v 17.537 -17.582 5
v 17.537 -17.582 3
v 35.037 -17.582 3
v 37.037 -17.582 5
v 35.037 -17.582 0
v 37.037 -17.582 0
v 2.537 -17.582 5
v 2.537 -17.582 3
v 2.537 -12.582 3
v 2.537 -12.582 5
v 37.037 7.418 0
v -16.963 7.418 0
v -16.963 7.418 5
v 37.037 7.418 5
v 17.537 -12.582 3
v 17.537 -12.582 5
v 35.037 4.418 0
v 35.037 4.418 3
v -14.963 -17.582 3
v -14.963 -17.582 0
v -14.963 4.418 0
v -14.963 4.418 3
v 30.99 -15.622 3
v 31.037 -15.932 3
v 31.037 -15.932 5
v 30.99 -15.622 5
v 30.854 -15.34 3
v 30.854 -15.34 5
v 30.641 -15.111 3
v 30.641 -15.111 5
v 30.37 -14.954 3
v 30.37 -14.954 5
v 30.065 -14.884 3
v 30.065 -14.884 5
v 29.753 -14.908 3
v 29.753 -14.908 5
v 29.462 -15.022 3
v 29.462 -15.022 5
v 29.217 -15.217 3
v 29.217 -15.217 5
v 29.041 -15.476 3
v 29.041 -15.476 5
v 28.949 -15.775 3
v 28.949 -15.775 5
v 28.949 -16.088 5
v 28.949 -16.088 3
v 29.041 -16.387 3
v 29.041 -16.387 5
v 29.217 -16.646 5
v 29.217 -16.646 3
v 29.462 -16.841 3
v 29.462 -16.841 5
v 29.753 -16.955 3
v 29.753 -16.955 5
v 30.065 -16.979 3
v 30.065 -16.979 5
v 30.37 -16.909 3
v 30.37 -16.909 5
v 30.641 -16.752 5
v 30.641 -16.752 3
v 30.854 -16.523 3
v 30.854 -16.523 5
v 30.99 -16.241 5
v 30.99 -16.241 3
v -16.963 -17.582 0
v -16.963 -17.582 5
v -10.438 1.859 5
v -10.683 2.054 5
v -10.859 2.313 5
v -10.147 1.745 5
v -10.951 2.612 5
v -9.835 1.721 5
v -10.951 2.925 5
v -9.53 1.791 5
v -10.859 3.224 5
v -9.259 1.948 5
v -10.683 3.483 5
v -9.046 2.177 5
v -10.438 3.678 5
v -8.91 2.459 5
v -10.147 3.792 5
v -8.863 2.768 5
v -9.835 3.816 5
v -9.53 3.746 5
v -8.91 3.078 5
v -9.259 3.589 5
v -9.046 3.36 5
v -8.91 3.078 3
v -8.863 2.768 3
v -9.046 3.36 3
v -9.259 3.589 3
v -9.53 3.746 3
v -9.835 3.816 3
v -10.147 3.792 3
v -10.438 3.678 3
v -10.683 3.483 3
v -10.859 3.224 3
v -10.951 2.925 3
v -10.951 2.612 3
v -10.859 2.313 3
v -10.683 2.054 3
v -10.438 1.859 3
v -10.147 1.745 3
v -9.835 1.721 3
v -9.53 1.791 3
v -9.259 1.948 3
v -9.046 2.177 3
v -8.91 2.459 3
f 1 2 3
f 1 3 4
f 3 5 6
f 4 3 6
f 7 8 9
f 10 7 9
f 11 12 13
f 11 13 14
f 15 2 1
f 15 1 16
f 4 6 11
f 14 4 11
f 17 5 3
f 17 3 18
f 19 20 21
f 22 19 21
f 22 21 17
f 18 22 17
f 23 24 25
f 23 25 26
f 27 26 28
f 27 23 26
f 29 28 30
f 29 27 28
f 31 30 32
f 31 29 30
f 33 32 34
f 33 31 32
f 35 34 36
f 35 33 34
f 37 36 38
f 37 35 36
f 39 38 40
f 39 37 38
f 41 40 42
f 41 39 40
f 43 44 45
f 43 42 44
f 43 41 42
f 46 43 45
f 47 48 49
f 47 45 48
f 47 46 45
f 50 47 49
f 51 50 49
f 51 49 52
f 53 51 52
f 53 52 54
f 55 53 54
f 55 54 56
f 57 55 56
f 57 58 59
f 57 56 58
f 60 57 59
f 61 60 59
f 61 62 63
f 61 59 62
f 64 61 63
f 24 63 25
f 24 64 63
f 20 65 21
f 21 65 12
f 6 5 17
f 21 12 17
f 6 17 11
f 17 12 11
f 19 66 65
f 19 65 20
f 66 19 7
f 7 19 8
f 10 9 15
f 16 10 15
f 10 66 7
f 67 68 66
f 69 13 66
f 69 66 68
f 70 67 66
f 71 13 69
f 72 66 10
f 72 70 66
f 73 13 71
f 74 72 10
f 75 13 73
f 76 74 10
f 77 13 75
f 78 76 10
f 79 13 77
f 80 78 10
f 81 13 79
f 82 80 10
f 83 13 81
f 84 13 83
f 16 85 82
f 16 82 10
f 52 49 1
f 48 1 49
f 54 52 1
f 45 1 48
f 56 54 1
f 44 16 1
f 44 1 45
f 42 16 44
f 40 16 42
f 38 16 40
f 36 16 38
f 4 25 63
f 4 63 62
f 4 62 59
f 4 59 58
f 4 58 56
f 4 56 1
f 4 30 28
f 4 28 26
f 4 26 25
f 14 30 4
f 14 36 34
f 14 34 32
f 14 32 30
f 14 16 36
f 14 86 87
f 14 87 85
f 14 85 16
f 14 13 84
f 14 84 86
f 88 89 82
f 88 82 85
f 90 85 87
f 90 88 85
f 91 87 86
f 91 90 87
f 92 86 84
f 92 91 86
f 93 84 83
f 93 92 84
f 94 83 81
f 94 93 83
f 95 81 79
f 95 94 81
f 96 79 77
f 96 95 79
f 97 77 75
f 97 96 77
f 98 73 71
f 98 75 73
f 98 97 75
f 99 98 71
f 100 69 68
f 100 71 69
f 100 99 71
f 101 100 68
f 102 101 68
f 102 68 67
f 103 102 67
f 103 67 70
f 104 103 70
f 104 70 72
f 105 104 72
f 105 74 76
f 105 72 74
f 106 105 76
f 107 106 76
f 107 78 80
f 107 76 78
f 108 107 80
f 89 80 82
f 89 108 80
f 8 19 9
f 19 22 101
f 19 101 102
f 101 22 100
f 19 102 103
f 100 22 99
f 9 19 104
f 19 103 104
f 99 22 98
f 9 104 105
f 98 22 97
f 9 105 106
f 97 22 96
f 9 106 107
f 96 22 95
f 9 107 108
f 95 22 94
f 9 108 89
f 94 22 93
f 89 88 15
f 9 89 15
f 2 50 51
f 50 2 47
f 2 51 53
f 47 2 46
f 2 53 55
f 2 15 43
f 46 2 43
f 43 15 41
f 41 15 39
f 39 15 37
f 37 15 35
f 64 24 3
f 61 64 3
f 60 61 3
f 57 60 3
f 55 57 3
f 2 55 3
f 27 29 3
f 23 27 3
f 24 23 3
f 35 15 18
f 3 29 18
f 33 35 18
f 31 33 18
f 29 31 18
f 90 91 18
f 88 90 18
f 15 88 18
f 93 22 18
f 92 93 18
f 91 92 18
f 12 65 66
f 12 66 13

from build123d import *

# Parameters (mm, degrees)
SKETCH_1_W          = 54
SKETCH_1_H          = 25
EXTRUDE_1_DEPTH     = 5
SKETCH_2_W          = 50
SKETCH_2_H          = 22
CUT_EXTRUDE_1_DEPTH = 3
SKETCH_3_R          = 1.05
CUT_EXTRUDE_2_DEPTH = 17
SKETCH_4_W          = 15
SKETCH_4_H          = 5
CUT_EXTRUDE_3_DEPTH = 18


with BuildPart() as part:
    # 草圖1 → 填料-伸長1 (new body)
    with BuildSketch(Plane.XY):
        with Locations((10.036827119, -5.081562568)):
            Rectangle(SKETCH_1_W, SKETCH_1_H)
    extrude(amount=EXTRUDE_1_DEPTH)

    # 草圖2 → 除料-伸長1 (cut)
    with BuildSketch(Plane.XY):
        with Locations((10.036827119, -6.581562568)):
            Rectangle(SKETCH_2_W, SKETCH_2_H)
    extrude(amount=CUT_EXTRUDE_1_DEPTH, mode=Mode.SUBTRACT)

    # 草圖3 → 除料-伸長2 (cut)
    with BuildSketch(Plane.XY):
        with Locations((29.986827119, -15.931562568)):
            Circle(SKETCH_3_R)
        with Locations((-9.913172881, 2.768437432)):
            Circle(SKETCH_3_R)
    extrude(amount=CUT_EXTRUDE_2_DEPTH, mode=Mode.SUBTRACT)

    # 草圖4 → 除料-伸長3 (cut)
    with BuildSketch(Plane.XY):
        with Locations((10.036827119, -15.081562568)):
            Rectangle(SKETCH_4_W, SKETCH_4_H)
    extrude(amount=CUT_EXTRUDE_3_DEPTH, mode=Mode.SUBTRACT)


solid = part.part
